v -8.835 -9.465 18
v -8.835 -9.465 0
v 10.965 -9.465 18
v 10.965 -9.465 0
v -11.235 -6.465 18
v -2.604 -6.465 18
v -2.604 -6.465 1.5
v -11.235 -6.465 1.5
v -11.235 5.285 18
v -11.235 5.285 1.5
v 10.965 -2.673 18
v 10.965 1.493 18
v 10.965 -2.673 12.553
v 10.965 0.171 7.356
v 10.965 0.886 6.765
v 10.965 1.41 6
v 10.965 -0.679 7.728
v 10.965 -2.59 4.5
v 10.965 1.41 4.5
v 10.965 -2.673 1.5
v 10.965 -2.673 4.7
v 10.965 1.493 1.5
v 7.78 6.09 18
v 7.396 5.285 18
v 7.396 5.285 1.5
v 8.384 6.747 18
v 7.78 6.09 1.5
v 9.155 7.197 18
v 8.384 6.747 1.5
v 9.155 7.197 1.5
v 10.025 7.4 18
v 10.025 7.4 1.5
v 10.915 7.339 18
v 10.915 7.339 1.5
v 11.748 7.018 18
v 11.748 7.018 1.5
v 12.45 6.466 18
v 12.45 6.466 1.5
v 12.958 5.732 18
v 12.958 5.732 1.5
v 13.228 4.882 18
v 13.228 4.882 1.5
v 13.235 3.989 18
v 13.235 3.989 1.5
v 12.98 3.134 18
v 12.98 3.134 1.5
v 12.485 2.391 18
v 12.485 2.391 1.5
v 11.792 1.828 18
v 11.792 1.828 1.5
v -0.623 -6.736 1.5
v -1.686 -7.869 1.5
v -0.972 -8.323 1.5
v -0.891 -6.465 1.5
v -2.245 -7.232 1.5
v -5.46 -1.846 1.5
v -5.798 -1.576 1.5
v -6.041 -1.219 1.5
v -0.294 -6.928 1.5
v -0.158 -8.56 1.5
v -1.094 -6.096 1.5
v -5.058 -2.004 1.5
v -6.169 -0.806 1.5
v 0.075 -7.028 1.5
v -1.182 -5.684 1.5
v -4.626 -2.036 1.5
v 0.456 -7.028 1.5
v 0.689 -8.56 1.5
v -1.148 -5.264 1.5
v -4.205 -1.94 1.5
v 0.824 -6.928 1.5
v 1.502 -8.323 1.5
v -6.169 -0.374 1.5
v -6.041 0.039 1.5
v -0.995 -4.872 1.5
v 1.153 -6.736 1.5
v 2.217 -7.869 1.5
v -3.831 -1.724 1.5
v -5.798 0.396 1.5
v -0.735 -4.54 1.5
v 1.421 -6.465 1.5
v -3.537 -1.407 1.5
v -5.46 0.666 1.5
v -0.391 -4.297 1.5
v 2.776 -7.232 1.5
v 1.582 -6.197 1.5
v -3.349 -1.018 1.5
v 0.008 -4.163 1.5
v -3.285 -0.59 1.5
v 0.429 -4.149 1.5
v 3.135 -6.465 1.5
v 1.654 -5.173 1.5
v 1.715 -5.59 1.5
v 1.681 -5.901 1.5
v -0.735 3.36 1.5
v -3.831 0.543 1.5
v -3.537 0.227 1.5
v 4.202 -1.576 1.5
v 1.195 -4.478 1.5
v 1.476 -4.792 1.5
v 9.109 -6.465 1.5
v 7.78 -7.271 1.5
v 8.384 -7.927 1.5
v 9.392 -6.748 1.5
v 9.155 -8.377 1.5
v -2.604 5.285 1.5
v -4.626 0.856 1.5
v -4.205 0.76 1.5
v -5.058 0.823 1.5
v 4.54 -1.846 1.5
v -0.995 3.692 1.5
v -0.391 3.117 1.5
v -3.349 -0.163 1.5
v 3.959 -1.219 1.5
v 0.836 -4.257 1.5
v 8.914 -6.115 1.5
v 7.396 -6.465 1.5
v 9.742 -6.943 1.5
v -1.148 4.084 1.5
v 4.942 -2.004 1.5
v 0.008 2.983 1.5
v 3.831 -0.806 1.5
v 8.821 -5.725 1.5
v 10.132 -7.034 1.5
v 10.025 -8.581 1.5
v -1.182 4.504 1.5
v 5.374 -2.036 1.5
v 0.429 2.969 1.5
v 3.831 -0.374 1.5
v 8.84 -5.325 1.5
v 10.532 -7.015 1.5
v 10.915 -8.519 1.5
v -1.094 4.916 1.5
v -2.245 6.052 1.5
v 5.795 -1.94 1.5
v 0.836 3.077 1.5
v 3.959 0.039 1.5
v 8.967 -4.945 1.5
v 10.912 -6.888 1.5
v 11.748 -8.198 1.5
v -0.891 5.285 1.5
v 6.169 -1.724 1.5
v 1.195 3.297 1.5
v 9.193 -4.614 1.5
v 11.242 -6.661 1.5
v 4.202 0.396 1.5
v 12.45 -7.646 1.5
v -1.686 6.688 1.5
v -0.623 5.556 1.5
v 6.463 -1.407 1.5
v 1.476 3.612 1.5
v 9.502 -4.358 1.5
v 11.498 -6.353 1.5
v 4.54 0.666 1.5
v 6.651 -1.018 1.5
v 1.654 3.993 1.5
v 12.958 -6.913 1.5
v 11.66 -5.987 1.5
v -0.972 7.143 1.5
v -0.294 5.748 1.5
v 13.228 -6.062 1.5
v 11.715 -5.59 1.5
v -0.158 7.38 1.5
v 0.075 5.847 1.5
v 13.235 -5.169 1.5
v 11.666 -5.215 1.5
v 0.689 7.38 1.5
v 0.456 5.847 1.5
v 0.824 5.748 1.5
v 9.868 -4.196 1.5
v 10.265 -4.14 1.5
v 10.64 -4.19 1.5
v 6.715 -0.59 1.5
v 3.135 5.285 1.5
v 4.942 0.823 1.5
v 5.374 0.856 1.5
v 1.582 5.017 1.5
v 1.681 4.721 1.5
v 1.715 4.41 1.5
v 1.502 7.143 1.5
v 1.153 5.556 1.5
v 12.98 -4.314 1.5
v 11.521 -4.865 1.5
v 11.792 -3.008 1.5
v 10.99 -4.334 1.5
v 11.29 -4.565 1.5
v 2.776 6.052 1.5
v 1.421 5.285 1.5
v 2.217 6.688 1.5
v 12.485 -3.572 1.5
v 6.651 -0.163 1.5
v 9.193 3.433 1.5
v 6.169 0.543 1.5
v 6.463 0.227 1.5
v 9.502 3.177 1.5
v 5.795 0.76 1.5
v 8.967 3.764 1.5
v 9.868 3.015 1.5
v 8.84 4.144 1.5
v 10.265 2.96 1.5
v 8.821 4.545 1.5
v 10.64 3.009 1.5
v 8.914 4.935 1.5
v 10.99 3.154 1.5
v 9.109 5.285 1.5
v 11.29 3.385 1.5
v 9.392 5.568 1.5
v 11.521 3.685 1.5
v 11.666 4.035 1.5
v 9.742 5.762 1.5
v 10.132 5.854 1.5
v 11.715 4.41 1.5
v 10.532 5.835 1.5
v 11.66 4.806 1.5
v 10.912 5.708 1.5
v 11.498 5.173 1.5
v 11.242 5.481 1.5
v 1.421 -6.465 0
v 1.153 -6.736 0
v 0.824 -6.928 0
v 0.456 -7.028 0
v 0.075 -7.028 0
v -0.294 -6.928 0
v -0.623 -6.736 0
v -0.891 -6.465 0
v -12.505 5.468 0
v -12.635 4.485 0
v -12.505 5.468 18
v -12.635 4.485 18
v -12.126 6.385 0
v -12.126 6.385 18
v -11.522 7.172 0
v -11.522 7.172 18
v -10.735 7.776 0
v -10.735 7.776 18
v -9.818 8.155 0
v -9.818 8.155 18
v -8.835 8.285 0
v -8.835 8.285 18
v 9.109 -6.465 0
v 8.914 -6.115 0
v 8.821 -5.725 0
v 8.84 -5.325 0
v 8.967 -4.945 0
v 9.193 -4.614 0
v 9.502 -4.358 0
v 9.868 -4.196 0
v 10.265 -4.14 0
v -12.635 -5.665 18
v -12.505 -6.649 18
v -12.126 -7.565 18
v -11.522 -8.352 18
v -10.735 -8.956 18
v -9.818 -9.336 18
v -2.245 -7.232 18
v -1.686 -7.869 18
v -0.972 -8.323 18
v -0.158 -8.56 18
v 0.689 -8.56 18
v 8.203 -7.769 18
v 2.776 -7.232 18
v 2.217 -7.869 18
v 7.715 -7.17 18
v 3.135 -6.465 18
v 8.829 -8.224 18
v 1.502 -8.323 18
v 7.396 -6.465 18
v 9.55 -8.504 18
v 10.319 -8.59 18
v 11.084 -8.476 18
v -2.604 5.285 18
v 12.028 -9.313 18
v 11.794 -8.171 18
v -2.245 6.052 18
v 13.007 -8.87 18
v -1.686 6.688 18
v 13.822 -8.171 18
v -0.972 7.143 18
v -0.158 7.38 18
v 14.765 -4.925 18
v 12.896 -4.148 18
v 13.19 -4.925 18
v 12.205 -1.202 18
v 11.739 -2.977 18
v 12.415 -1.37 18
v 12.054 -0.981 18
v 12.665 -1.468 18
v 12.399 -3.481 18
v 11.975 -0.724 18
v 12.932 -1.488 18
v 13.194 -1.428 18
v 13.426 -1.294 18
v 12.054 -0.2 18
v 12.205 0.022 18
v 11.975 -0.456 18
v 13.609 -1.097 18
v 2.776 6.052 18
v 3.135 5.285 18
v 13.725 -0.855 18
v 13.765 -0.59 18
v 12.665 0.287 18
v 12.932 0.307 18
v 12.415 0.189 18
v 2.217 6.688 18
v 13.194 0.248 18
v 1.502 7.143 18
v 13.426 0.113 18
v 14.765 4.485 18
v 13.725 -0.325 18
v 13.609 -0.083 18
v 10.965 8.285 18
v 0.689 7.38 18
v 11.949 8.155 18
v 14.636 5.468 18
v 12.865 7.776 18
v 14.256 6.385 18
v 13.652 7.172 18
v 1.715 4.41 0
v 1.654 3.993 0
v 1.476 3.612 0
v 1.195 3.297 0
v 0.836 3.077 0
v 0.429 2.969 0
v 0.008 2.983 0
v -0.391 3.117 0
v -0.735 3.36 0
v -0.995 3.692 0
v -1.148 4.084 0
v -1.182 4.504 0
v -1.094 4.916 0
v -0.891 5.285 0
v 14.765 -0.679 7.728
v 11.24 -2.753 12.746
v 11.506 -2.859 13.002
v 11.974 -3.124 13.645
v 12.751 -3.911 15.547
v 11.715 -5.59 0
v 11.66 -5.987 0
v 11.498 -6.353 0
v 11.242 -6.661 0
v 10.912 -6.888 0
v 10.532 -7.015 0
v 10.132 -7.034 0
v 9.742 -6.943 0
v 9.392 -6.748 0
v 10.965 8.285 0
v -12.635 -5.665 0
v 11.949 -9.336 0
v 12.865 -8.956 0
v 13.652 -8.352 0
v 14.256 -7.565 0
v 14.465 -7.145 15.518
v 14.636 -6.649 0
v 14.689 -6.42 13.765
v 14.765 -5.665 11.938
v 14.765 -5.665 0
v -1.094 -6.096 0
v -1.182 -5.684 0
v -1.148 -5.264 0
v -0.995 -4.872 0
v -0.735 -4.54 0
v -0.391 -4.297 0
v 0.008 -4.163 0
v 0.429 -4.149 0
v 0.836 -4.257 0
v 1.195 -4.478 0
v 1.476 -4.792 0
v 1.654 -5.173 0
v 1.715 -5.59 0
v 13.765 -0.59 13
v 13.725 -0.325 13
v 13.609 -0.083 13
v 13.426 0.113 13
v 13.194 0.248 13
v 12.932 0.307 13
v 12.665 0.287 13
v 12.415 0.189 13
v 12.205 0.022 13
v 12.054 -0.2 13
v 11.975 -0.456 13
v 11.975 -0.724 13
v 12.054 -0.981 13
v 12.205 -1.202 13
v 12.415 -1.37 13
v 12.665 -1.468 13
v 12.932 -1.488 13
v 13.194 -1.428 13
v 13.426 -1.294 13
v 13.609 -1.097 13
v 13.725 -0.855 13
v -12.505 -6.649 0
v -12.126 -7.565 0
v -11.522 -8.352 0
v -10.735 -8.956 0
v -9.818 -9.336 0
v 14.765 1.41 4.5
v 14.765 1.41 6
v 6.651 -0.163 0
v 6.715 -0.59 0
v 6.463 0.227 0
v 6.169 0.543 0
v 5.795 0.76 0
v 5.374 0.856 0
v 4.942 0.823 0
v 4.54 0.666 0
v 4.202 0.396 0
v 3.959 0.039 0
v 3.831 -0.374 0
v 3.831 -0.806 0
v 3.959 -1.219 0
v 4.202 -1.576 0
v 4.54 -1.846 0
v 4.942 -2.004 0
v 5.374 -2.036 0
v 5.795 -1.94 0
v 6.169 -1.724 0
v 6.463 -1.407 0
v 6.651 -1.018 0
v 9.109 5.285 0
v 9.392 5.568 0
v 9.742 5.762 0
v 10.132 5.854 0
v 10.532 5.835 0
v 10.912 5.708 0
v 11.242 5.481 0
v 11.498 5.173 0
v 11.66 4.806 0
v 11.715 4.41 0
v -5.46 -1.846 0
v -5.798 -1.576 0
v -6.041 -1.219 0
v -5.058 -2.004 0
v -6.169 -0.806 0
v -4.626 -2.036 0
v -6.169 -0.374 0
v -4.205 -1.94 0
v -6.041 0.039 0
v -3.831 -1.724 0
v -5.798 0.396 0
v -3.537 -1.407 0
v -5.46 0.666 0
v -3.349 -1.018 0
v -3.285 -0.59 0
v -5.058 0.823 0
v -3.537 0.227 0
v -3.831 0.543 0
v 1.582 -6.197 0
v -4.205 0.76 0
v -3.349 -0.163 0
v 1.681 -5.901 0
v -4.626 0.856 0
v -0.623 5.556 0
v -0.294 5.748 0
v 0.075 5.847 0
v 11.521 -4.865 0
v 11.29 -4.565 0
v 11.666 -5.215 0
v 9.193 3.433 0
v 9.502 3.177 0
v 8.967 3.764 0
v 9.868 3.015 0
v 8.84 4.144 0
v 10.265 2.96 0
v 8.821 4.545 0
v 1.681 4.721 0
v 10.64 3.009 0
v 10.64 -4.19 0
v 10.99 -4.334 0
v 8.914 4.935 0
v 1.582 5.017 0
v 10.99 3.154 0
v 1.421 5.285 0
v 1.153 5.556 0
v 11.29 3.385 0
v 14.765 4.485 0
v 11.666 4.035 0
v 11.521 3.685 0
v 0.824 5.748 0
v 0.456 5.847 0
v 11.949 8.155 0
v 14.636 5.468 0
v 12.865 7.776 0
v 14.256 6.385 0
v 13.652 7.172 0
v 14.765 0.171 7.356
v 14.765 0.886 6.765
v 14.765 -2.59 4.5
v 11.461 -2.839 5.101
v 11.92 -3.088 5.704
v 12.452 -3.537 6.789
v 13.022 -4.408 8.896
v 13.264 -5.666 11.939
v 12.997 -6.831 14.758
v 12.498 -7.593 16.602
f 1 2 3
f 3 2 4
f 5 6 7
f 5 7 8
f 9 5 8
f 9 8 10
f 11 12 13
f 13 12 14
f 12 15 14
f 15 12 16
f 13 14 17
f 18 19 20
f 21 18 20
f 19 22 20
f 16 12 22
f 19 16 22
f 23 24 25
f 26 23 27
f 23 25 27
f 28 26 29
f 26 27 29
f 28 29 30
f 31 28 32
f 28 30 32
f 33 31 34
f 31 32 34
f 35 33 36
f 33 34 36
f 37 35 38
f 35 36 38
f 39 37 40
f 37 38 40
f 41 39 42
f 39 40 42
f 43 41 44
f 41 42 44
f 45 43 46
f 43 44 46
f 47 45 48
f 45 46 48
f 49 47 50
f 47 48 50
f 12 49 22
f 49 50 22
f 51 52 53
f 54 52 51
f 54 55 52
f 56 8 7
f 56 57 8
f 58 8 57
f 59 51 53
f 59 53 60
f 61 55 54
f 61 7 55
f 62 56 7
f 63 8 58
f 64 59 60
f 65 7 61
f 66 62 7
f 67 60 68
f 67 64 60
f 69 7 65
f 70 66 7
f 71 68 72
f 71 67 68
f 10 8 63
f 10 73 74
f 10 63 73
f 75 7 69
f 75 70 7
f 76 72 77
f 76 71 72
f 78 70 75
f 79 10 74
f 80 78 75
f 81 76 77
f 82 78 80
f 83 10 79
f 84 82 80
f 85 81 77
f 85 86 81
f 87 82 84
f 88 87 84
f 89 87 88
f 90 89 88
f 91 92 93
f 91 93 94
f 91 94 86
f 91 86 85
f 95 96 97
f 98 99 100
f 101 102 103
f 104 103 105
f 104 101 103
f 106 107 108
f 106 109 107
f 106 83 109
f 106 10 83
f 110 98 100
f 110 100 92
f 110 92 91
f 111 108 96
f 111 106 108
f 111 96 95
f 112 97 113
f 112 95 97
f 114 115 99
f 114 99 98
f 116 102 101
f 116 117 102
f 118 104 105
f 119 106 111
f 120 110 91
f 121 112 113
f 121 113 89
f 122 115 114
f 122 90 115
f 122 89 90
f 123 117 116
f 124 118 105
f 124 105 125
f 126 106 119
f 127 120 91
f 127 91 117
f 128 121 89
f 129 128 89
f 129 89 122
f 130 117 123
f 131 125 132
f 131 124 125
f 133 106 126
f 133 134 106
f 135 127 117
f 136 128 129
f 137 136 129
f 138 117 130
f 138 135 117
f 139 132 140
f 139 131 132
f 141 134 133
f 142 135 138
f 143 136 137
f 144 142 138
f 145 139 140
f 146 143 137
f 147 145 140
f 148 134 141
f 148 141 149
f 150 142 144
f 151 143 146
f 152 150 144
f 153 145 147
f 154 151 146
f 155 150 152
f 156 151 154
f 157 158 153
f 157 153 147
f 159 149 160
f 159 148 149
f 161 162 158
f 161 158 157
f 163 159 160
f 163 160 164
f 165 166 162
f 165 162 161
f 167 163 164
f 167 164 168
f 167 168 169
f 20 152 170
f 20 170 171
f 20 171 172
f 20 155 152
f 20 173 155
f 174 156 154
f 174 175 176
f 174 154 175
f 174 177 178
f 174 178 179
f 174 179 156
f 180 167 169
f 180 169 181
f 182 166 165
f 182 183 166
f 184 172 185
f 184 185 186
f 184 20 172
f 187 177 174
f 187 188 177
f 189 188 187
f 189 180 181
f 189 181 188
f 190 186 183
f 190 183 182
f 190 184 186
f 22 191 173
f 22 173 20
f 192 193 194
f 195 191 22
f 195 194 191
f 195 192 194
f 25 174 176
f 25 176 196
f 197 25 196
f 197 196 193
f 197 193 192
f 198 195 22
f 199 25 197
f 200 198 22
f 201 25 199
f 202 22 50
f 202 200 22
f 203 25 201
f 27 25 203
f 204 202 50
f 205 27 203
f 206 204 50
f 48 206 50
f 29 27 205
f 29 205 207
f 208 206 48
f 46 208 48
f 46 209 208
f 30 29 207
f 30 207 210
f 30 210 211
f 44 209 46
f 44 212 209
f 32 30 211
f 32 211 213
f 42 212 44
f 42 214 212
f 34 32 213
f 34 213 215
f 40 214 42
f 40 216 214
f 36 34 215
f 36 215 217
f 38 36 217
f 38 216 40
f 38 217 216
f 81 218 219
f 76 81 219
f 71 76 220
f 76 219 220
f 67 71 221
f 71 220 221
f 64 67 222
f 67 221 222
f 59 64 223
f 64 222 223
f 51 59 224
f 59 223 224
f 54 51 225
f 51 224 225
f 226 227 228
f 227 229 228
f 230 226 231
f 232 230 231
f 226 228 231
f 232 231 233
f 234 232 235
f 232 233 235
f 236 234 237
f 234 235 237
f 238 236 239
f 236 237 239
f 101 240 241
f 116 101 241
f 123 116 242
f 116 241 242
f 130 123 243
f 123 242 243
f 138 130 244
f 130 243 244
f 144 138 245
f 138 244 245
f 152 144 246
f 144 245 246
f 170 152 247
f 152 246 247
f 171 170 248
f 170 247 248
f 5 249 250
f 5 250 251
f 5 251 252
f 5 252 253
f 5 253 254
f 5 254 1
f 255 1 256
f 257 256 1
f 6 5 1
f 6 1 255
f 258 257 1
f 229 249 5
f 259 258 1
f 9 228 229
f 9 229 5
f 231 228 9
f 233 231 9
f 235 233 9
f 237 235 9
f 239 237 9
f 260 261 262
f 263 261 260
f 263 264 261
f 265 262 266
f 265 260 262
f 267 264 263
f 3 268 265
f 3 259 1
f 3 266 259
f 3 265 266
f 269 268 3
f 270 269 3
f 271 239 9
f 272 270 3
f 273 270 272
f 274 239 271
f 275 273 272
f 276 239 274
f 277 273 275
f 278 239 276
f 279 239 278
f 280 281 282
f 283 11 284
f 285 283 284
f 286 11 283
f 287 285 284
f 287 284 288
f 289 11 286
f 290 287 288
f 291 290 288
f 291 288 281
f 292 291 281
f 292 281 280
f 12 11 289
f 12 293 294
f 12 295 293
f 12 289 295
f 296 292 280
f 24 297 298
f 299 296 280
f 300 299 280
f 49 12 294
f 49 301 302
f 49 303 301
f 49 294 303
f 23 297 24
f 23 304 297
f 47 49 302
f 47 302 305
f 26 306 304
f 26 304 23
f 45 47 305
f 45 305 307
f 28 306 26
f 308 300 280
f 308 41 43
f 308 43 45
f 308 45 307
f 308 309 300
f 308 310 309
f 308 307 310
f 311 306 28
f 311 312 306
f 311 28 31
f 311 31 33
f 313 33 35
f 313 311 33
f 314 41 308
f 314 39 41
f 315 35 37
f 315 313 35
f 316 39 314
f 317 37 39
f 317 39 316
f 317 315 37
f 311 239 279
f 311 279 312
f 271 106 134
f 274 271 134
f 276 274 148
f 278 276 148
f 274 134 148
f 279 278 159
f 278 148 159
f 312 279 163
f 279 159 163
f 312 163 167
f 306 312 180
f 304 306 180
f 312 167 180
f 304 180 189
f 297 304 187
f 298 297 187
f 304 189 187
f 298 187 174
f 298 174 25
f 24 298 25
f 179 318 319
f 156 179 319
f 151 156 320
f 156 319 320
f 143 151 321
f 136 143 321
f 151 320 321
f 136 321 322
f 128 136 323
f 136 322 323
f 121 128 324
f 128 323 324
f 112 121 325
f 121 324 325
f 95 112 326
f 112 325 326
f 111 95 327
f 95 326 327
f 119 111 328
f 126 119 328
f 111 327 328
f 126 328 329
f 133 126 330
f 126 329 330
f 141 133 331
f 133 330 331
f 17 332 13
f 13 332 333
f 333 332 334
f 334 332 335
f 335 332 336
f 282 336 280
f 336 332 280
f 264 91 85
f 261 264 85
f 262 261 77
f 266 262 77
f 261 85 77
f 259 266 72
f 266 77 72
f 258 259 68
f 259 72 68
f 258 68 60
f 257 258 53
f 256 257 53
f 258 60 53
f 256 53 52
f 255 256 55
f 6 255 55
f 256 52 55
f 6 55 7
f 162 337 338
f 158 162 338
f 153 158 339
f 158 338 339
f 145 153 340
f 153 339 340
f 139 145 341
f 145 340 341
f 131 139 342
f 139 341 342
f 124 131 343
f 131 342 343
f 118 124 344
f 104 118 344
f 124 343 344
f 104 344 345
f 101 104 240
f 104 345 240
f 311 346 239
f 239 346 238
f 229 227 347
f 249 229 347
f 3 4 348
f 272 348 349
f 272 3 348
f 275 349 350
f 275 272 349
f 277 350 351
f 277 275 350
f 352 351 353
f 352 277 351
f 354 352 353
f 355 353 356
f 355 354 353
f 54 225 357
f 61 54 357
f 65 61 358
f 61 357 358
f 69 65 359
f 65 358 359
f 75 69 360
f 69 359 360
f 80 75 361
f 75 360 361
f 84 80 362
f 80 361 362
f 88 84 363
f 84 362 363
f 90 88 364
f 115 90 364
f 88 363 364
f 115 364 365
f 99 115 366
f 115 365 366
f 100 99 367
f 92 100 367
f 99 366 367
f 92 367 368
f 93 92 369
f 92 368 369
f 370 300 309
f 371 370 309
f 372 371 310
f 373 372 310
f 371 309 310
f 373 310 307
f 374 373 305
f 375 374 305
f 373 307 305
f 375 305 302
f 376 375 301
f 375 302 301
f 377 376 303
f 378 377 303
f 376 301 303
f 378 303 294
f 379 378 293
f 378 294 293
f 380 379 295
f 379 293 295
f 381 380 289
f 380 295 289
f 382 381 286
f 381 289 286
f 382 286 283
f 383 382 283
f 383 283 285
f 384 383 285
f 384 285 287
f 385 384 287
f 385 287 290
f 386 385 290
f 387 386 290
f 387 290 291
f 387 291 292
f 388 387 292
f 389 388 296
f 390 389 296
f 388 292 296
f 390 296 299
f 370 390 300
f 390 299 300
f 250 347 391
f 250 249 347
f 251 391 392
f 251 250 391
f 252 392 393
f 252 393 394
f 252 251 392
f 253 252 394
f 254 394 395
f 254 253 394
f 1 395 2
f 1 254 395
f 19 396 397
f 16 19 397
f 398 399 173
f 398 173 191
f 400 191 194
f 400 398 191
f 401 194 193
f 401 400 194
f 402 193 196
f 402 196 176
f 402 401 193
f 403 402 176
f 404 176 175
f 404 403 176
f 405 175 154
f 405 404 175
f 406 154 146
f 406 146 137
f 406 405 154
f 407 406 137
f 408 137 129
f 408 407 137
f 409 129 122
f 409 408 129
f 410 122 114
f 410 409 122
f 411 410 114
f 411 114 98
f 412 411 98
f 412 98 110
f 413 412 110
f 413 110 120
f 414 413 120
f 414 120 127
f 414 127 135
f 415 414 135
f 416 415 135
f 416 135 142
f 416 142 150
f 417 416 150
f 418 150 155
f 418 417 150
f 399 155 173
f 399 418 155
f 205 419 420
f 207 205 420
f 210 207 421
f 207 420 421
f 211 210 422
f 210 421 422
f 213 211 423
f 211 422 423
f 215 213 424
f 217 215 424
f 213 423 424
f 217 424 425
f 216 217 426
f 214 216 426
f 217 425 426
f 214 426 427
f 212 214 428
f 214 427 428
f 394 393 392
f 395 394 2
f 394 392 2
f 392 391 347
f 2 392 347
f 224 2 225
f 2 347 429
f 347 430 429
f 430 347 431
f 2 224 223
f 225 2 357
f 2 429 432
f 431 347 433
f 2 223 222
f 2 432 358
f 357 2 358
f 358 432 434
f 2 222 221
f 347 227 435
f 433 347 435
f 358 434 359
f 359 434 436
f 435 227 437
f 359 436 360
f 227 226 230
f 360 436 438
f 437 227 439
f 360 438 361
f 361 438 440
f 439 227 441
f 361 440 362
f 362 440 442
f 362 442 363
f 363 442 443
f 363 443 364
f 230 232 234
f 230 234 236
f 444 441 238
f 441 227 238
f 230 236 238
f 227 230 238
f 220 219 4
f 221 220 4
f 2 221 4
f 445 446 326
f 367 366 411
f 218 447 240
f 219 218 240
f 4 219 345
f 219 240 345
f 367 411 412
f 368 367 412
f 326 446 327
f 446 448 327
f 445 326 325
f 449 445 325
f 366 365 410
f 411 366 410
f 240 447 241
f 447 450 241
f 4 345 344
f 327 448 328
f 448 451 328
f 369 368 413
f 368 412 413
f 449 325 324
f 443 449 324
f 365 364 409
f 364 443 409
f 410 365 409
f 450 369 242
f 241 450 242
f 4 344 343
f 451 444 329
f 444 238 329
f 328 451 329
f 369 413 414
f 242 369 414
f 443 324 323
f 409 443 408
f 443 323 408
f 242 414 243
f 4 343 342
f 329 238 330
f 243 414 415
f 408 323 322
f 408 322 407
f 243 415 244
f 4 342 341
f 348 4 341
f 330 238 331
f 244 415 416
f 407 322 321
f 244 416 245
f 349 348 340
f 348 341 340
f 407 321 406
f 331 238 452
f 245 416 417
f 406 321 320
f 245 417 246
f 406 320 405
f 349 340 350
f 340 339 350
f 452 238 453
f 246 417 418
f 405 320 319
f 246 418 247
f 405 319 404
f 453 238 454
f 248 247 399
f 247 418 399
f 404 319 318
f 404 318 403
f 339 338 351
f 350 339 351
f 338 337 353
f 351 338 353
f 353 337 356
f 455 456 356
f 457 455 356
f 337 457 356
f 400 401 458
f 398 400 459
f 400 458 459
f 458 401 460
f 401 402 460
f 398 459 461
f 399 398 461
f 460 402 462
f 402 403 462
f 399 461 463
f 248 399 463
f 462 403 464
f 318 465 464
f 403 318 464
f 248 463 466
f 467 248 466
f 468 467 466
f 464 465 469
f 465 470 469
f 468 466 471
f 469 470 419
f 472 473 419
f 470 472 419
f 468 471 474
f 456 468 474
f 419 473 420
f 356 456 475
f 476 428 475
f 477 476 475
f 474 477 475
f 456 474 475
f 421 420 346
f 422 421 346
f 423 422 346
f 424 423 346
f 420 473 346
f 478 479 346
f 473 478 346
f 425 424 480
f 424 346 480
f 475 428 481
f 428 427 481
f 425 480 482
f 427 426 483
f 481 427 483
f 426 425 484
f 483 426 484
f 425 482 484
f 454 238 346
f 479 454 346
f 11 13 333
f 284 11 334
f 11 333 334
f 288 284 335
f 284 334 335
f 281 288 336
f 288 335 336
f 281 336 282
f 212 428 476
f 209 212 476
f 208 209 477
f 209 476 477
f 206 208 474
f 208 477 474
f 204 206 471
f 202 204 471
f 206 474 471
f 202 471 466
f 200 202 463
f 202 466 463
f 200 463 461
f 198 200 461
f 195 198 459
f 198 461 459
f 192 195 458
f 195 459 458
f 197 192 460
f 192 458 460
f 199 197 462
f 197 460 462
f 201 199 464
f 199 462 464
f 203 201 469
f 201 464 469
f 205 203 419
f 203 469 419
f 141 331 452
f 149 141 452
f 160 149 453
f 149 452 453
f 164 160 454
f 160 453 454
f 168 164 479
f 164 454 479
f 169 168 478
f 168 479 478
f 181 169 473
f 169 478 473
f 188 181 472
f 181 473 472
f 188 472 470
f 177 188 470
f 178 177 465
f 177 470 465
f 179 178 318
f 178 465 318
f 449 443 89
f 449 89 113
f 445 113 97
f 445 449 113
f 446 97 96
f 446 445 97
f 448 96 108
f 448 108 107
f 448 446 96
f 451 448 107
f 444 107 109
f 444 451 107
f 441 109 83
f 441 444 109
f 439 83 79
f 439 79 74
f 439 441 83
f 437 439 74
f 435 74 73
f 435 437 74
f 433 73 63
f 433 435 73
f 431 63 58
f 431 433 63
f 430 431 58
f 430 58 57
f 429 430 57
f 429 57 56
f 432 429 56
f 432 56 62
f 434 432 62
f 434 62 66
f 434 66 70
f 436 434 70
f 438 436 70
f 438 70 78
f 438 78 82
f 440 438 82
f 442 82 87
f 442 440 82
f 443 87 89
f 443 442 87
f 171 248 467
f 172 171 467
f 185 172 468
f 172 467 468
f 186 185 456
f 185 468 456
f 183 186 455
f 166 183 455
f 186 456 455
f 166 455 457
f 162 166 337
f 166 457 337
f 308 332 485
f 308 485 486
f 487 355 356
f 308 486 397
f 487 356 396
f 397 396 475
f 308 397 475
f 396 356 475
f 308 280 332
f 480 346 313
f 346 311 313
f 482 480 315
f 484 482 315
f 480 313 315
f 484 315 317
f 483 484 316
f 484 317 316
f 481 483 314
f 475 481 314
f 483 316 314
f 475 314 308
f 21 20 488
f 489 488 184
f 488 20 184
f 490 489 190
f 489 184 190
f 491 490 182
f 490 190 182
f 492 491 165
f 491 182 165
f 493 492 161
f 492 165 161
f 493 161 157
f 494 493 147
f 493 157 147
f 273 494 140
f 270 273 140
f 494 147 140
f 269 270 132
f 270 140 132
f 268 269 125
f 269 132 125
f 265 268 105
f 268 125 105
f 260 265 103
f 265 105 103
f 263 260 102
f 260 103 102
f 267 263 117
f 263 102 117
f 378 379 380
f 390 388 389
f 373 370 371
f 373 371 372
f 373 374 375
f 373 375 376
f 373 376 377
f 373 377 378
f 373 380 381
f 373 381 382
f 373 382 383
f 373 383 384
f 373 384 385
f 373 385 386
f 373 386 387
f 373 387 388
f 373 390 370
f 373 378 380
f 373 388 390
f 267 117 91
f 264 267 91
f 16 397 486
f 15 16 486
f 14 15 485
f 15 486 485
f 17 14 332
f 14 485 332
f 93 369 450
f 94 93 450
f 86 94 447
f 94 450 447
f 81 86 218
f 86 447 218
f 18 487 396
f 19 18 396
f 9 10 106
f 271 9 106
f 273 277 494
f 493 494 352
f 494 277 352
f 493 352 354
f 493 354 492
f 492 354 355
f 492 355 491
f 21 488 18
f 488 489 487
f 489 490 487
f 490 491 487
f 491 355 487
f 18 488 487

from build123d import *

# Parameters (mm, degrees)
F0_R     = 1.45
F1_DEPTH = 1.5
F2_DEPTH = 18
F3_R     = 0.9
F4_DEPTH = 5
F6_DEPTH = 5
F7_R     = 3.8


with BuildPart() as f1:
    # F0 (on Top) → F1 (new body)
    with BuildSketch(Plane.XY):
        with BuildLine():
            Line((-2.6044162591, 5.2848328158), (-11.2348561883, 5.2848328158))
            Line((-11.2348561883, 5.2848328158), (-11.2348561883, -6.4651671842))
            Line((-11.2348561883, -6.4651671842), (-2.6044162591, -6.4651671842))
            ThreePointArc((-2.6044162591, -6.4651671842), (-0.1771907831, -2.6229563548), (3.2651438117, -5.5901671842))
            ThreePointArc((3.2651438117, -5.5901671842), (3.2323546411, -6.032501779), (3.1347038825, -6.4651671842))
            Line((3.1347038825, -6.4651671842), (7.3955837409, -6.4651671842))
            ThreePointArc((7.3955837409, -6.4651671842), (7.8542311215, -3.8048100771), (10.2651438117, -2.5901671842))
            Line((10.2651438117, -2.5901671842), (10.2651438117, 1.4098328158))
            ThreePointArc((10.2651438117, 1.4098328158), (7.8542311215, 2.6244757087), (7.3955837409, 5.2848328158))
            Line((7.3955837409, 5.2848328158), (3.1347038825, 5.2848328158))
            ThreePointArc((3.1347038825, 5.2848328158), (3.2323546411, 4.8521674106), (3.2651438117, 4.4098328158))
            ThreePointArc((3.2651438117, 4.4098328158), (-0.1771907831, 1.4426219864), (-2.6044162591, 5.2848328158))
        make_face()
        with Locations((-4.7348561883, -0.5901671842)):
            Circle(F0_R, mode=Mode.SUBTRACT)
        with Locations((5.2651438117, -0.5901671842)):
            Circle(F0_R, mode=Mode.SUBTRACT)
        with BuildLine():
            ThreePointArc((10.2651438117, -2.5901671842), (7.8542311215, -3.8048100771), (7.3955837409, -6.4651671842))
            Line((7.3955837409, -6.4651671842), (9.1089107037, -6.4651671842))
            ThreePointArc((9.1089107037, -6.4651671842), (8.9668275944, -4.9445086057), (10.2651438117, -4.1401671842))
            Line((10.2651438117, -4.1401671842), (10.2651438117, -2.5901671842))
        make_face()
        with BuildLine():
            Line((9.1089107037, 5.2848328158), (7.3955837409, 5.2848328158))
            ThreePointArc((7.3955837409, 5.2848328158), (7.8542311215, 2.6244757087), (10.2651438117, 1.4098328158))
            Line((10.2651438117, 1.4098328158), (10.2651438117, 2.9598328158))
            ThreePointArc((10.2651438117, 2.9598328158), (8.9668275944, 3.7641742373), (9.1089107037, 5.2848328158))
        make_face()
        with BuildLine():
            Line((9.1089107037, -6.4651671842), (7.3955837409, -6.4651671842))
            ThreePointArc((7.3955837409, -6.4651671842), (10.7074784065, -8.5573780136), (13.2651438117, -5.5901671842))
            ThreePointArc((13.2651438117, -5.5901671842), (12.6209876096, -3.7327496221), (10.9651438117, -2.672976755))
            ThreePointArc((10.9651438117, -2.672976755), (10.6175843829, -2.6109415057), (10.2651438117, -2.5901671842))
            Line((10.2651438117, -2.5901671842), (10.2651438117, -4.1401671842))
            ThreePointArc((10.2651438117, -4.1401671842), (11.2904486444, -4.5648623515), (11.7151438117, -5.5901671842))
            ThreePointArc((11.7151438117, -5.5901671842), (10.7266424539, -6.9647649448), (9.1089107037, -6.4651671842))
        make_face()
        with BuildLine():
            ThreePointArc((3.1347038825, 5.2848328158), (0.2651438117, 7.4098328158), (-2.6044162591, 5.2848328158))
            Line((-2.6044162591, 5.2848328158), (-0.8910892963, 5.2848328158))
            ThreePointArc((-0.8910892963, 5.2848328158), (0.2651438117, 5.8598328158), (1.4213769197, 5.2848328158))
            Line((1.4213769197, 5.2848328158), (3.1347038825, 5.2848328158))
        make_face()
        with BuildLine():
            Line((-0.8910892963, 5.2848328158), (-2.6044162591, 5.2848328158))
            ThreePointArc((-2.6044162591, 5.2848328158), (-0.1771907831, 1.4426219864), (3.2651438117, 4.4098328158))
            ThreePointArc((3.2651438117, 4.4098328158), (3.2323546411, 4.8521674106), (3.1347038825, 5.2848328158))
            Line((3.1347038825, 5.2848328158), (1.4213769197, 5.2848328158))
            ThreePointArc((1.4213769197, 5.2848328158), (1.6397415722, 4.8713314579), (1.7151438117, 4.4098328158))
            ThreePointArc((1.7151438117, 4.4098328158), (-0.1963548305, 3.0352350552), (-0.8910892963, 5.2848328158))
        make_face()
        with BuildLine():
            ThreePointArc((13.2651438117, 4.4098328158), (10.7074784065, 7.3770436452), (7.3955837409, 5.2848328158))
            Line((7.3955837409, 5.2848328158), (9.1089107037, 5.2848328158))
            ThreePointArc((9.1089107037, 5.2848328158), (10.7266424539, 5.7844305763), (11.7151438117, 4.4098328158))
            ThreePointArc((11.7151438117, 4.4098328158), (11.2904486444, 3.3845279831), (10.2651438117, 2.9598328158))
            Line((10.2651438117, 2.9598328158), (10.2651438117, 1.4098328158))
            ThreePointArc((10.2651438117, 1.4098328158), (10.6175843829, 1.4306071372), (10.9651438117, 1.4926423866))
            ThreePointArc((10.9651438117, 1.4926423866), (12.6209876096, 2.5524152537), (13.2651438117, 4.4098328158))
        make_face()
        with BuildLine():
            ThreePointArc((3.2651438117, -5.5901671842), (-0.1771907831, -2.6229563548), (-2.6044162591, -6.4651671842))
            Line((-2.6044162591, -6.4651671842), (-0.8910892963, -6.4651671842))
            ThreePointArc((-0.8910892963, -6.4651671842), (-0.1963548305, -4.2155694237), (1.7151438117, -5.5901671842))
            ThreePointArc((1.7151438117, -5.5901671842), (1.6397415722, -6.0516658264), (1.4213769197, -6.4651671842))
            Line((1.4213769197, -6.4651671842), (3.1347038825, -6.4651671842))
            ThreePointArc((3.1347038825, -6.4651671842), (3.2323546411, -6.032501779), (3.2651438117, -5.5901671842))
        make_face()
        with BuildLine():
            Line((-0.8910892963, -6.4651671842), (-2.6044162591, -6.4651671842))
            ThreePointArc((-2.6044162591, -6.4651671842), (0.2651438117, -8.5901671842), (3.1347038825, -6.4651671842))
            Line((3.1347038825, -6.4651671842), (1.4213769197, -6.4651671842))
            ThreePointArc((1.4213769197, -6.4651671842), (0.2651438117, -7.0401671842), (-0.8910892963, -6.4651671842))
        make_face()
        with BuildLine():
            ThreePointArc((10.9651438117, 1.4926423866), (10.6175843829, 1.4306071372), (10.2651438117, 1.4098328158))
            Line((10.2651438117, 1.4098328158), (10.2651438117, -2.5901671842))
            ThreePointArc((10.2651438117, -2.5901671842), (10.6175843829, -2.6109415057), (10.9651438117, -2.672976755))
            Line((10.9651438117, -2.672976755), (10.9651438117, 1.4926423866))
        make_face()
    extrude(amount=F1_DEPTH)

    # F0 (on Top) → F2 (join)
    with BuildSketch(Plane.XY):
        Polygon((11.6651438117, 8.2848328158), (-12.6348561883, 8.2848328158), (-12.6348561883, -9.4651671842), (14.7651438117, -9.4651671842), (14.7651438117, 8.2848328158), align=None)
        with BuildLine():
            Line((-11.2348561883, -6.4651671842), (-11.2348561883, 5.2848328158))
            Line((-11.2348561883, 5.2848328158), (-2.6044162591, 5.2848328158))
            ThreePointArc((-2.6044162591, 5.2848328158), (0.2651438117, 7.4098328158), (3.1347038825, 5.2848328158))
            Line((3.1347038825, 5.2848328158), (7.3955837409, 5.2848328158))
            ThreePointArc((7.3955837409, 5.2848328158), (10.7074784065, 7.3770436452), (13.2651438117, 4.4098328158))
            ThreePointArc((13.2651438117, 4.4098328158), (12.6209876096, 2.5524152537), (10.9651438117, 1.4926423866))
            Line((10.9651438117, 1.4926423866), (10.9651438117, -2.672976755))
            ThreePointArc((10.9651438117, -2.672976755), (12.6209876096, -3.7327496221), (13.2651438117, -5.5901671842))
            ThreePointArc((13.2651438117, -5.5901671842), (10.7074784065, -8.5573780136), (7.3955837409, -6.4651671842))
            Line((7.3955837409, -6.4651671842), (3.1347038825, -6.4651671842))
            ThreePointArc((3.1347038825, -6.4651671842), (0.2651438117, -8.5901671842), (-2.6044162591, -6.4651671842))
            Line((-2.6044162591, -6.4651671842), (-11.2348561883, -6.4651671842))
        make_face(mode=Mode.SUBTRACT)
    extrude(amount=F2_DEPTH)

    # F3 (on face) → F4 (cut)
    with BuildSketch(Plane.XY.offset(18)):
        with Locations((12.8651438117, -0.5901671842)):
            Circle(F3_R)
    extrude(amount=-F4_DEPTH, mode=Mode.SUBTRACT)

    # F5 (on face) → F6 (cut)
    with BuildSketch(Plane.YZ.offset(14.7651438117)):
        Polygon((-2.5901671842, 4.5), (-2.5901671842, 6), (0.0359741347, 6), (-0.6785203239, 7.7283125886), (-4.924895537, 18), (-8.171145565, 18), align=None)
        Polygon((0.0359741347, 6), (-2.5901671842, 6), (-2.5901671842, 4.5), (1.4098328158, 4.5), (1.4098328158, 6), align=None)
        with BuildLine():
            Line((-0.6785203239, 7.7283125886), (0.0359741347, 6))
            Line((0.0359741347, 6), (1.4098328158, 6))
            ThreePointArc((1.4098328158, 6), (0.5488853545, 7.0855555288), (-0.6785203239, 7.7283125886))
        make_face()
    extrude(amount=-F6_DEPTH, mode=Mode.SUBTRACT)

    # F7
    f7_edges = [f1.edges().sort_by_distance(p)[0] for p in [
        (14.765144, 8.284833, 9),
        (-12.634856, 8.284833, 9),
        (-12.634856, -9.465167, 9),
        (14.765144, -9.465167, 9),
    ]]
    fillet(f7_edges, radius=F7_R)


solid = f1.part
